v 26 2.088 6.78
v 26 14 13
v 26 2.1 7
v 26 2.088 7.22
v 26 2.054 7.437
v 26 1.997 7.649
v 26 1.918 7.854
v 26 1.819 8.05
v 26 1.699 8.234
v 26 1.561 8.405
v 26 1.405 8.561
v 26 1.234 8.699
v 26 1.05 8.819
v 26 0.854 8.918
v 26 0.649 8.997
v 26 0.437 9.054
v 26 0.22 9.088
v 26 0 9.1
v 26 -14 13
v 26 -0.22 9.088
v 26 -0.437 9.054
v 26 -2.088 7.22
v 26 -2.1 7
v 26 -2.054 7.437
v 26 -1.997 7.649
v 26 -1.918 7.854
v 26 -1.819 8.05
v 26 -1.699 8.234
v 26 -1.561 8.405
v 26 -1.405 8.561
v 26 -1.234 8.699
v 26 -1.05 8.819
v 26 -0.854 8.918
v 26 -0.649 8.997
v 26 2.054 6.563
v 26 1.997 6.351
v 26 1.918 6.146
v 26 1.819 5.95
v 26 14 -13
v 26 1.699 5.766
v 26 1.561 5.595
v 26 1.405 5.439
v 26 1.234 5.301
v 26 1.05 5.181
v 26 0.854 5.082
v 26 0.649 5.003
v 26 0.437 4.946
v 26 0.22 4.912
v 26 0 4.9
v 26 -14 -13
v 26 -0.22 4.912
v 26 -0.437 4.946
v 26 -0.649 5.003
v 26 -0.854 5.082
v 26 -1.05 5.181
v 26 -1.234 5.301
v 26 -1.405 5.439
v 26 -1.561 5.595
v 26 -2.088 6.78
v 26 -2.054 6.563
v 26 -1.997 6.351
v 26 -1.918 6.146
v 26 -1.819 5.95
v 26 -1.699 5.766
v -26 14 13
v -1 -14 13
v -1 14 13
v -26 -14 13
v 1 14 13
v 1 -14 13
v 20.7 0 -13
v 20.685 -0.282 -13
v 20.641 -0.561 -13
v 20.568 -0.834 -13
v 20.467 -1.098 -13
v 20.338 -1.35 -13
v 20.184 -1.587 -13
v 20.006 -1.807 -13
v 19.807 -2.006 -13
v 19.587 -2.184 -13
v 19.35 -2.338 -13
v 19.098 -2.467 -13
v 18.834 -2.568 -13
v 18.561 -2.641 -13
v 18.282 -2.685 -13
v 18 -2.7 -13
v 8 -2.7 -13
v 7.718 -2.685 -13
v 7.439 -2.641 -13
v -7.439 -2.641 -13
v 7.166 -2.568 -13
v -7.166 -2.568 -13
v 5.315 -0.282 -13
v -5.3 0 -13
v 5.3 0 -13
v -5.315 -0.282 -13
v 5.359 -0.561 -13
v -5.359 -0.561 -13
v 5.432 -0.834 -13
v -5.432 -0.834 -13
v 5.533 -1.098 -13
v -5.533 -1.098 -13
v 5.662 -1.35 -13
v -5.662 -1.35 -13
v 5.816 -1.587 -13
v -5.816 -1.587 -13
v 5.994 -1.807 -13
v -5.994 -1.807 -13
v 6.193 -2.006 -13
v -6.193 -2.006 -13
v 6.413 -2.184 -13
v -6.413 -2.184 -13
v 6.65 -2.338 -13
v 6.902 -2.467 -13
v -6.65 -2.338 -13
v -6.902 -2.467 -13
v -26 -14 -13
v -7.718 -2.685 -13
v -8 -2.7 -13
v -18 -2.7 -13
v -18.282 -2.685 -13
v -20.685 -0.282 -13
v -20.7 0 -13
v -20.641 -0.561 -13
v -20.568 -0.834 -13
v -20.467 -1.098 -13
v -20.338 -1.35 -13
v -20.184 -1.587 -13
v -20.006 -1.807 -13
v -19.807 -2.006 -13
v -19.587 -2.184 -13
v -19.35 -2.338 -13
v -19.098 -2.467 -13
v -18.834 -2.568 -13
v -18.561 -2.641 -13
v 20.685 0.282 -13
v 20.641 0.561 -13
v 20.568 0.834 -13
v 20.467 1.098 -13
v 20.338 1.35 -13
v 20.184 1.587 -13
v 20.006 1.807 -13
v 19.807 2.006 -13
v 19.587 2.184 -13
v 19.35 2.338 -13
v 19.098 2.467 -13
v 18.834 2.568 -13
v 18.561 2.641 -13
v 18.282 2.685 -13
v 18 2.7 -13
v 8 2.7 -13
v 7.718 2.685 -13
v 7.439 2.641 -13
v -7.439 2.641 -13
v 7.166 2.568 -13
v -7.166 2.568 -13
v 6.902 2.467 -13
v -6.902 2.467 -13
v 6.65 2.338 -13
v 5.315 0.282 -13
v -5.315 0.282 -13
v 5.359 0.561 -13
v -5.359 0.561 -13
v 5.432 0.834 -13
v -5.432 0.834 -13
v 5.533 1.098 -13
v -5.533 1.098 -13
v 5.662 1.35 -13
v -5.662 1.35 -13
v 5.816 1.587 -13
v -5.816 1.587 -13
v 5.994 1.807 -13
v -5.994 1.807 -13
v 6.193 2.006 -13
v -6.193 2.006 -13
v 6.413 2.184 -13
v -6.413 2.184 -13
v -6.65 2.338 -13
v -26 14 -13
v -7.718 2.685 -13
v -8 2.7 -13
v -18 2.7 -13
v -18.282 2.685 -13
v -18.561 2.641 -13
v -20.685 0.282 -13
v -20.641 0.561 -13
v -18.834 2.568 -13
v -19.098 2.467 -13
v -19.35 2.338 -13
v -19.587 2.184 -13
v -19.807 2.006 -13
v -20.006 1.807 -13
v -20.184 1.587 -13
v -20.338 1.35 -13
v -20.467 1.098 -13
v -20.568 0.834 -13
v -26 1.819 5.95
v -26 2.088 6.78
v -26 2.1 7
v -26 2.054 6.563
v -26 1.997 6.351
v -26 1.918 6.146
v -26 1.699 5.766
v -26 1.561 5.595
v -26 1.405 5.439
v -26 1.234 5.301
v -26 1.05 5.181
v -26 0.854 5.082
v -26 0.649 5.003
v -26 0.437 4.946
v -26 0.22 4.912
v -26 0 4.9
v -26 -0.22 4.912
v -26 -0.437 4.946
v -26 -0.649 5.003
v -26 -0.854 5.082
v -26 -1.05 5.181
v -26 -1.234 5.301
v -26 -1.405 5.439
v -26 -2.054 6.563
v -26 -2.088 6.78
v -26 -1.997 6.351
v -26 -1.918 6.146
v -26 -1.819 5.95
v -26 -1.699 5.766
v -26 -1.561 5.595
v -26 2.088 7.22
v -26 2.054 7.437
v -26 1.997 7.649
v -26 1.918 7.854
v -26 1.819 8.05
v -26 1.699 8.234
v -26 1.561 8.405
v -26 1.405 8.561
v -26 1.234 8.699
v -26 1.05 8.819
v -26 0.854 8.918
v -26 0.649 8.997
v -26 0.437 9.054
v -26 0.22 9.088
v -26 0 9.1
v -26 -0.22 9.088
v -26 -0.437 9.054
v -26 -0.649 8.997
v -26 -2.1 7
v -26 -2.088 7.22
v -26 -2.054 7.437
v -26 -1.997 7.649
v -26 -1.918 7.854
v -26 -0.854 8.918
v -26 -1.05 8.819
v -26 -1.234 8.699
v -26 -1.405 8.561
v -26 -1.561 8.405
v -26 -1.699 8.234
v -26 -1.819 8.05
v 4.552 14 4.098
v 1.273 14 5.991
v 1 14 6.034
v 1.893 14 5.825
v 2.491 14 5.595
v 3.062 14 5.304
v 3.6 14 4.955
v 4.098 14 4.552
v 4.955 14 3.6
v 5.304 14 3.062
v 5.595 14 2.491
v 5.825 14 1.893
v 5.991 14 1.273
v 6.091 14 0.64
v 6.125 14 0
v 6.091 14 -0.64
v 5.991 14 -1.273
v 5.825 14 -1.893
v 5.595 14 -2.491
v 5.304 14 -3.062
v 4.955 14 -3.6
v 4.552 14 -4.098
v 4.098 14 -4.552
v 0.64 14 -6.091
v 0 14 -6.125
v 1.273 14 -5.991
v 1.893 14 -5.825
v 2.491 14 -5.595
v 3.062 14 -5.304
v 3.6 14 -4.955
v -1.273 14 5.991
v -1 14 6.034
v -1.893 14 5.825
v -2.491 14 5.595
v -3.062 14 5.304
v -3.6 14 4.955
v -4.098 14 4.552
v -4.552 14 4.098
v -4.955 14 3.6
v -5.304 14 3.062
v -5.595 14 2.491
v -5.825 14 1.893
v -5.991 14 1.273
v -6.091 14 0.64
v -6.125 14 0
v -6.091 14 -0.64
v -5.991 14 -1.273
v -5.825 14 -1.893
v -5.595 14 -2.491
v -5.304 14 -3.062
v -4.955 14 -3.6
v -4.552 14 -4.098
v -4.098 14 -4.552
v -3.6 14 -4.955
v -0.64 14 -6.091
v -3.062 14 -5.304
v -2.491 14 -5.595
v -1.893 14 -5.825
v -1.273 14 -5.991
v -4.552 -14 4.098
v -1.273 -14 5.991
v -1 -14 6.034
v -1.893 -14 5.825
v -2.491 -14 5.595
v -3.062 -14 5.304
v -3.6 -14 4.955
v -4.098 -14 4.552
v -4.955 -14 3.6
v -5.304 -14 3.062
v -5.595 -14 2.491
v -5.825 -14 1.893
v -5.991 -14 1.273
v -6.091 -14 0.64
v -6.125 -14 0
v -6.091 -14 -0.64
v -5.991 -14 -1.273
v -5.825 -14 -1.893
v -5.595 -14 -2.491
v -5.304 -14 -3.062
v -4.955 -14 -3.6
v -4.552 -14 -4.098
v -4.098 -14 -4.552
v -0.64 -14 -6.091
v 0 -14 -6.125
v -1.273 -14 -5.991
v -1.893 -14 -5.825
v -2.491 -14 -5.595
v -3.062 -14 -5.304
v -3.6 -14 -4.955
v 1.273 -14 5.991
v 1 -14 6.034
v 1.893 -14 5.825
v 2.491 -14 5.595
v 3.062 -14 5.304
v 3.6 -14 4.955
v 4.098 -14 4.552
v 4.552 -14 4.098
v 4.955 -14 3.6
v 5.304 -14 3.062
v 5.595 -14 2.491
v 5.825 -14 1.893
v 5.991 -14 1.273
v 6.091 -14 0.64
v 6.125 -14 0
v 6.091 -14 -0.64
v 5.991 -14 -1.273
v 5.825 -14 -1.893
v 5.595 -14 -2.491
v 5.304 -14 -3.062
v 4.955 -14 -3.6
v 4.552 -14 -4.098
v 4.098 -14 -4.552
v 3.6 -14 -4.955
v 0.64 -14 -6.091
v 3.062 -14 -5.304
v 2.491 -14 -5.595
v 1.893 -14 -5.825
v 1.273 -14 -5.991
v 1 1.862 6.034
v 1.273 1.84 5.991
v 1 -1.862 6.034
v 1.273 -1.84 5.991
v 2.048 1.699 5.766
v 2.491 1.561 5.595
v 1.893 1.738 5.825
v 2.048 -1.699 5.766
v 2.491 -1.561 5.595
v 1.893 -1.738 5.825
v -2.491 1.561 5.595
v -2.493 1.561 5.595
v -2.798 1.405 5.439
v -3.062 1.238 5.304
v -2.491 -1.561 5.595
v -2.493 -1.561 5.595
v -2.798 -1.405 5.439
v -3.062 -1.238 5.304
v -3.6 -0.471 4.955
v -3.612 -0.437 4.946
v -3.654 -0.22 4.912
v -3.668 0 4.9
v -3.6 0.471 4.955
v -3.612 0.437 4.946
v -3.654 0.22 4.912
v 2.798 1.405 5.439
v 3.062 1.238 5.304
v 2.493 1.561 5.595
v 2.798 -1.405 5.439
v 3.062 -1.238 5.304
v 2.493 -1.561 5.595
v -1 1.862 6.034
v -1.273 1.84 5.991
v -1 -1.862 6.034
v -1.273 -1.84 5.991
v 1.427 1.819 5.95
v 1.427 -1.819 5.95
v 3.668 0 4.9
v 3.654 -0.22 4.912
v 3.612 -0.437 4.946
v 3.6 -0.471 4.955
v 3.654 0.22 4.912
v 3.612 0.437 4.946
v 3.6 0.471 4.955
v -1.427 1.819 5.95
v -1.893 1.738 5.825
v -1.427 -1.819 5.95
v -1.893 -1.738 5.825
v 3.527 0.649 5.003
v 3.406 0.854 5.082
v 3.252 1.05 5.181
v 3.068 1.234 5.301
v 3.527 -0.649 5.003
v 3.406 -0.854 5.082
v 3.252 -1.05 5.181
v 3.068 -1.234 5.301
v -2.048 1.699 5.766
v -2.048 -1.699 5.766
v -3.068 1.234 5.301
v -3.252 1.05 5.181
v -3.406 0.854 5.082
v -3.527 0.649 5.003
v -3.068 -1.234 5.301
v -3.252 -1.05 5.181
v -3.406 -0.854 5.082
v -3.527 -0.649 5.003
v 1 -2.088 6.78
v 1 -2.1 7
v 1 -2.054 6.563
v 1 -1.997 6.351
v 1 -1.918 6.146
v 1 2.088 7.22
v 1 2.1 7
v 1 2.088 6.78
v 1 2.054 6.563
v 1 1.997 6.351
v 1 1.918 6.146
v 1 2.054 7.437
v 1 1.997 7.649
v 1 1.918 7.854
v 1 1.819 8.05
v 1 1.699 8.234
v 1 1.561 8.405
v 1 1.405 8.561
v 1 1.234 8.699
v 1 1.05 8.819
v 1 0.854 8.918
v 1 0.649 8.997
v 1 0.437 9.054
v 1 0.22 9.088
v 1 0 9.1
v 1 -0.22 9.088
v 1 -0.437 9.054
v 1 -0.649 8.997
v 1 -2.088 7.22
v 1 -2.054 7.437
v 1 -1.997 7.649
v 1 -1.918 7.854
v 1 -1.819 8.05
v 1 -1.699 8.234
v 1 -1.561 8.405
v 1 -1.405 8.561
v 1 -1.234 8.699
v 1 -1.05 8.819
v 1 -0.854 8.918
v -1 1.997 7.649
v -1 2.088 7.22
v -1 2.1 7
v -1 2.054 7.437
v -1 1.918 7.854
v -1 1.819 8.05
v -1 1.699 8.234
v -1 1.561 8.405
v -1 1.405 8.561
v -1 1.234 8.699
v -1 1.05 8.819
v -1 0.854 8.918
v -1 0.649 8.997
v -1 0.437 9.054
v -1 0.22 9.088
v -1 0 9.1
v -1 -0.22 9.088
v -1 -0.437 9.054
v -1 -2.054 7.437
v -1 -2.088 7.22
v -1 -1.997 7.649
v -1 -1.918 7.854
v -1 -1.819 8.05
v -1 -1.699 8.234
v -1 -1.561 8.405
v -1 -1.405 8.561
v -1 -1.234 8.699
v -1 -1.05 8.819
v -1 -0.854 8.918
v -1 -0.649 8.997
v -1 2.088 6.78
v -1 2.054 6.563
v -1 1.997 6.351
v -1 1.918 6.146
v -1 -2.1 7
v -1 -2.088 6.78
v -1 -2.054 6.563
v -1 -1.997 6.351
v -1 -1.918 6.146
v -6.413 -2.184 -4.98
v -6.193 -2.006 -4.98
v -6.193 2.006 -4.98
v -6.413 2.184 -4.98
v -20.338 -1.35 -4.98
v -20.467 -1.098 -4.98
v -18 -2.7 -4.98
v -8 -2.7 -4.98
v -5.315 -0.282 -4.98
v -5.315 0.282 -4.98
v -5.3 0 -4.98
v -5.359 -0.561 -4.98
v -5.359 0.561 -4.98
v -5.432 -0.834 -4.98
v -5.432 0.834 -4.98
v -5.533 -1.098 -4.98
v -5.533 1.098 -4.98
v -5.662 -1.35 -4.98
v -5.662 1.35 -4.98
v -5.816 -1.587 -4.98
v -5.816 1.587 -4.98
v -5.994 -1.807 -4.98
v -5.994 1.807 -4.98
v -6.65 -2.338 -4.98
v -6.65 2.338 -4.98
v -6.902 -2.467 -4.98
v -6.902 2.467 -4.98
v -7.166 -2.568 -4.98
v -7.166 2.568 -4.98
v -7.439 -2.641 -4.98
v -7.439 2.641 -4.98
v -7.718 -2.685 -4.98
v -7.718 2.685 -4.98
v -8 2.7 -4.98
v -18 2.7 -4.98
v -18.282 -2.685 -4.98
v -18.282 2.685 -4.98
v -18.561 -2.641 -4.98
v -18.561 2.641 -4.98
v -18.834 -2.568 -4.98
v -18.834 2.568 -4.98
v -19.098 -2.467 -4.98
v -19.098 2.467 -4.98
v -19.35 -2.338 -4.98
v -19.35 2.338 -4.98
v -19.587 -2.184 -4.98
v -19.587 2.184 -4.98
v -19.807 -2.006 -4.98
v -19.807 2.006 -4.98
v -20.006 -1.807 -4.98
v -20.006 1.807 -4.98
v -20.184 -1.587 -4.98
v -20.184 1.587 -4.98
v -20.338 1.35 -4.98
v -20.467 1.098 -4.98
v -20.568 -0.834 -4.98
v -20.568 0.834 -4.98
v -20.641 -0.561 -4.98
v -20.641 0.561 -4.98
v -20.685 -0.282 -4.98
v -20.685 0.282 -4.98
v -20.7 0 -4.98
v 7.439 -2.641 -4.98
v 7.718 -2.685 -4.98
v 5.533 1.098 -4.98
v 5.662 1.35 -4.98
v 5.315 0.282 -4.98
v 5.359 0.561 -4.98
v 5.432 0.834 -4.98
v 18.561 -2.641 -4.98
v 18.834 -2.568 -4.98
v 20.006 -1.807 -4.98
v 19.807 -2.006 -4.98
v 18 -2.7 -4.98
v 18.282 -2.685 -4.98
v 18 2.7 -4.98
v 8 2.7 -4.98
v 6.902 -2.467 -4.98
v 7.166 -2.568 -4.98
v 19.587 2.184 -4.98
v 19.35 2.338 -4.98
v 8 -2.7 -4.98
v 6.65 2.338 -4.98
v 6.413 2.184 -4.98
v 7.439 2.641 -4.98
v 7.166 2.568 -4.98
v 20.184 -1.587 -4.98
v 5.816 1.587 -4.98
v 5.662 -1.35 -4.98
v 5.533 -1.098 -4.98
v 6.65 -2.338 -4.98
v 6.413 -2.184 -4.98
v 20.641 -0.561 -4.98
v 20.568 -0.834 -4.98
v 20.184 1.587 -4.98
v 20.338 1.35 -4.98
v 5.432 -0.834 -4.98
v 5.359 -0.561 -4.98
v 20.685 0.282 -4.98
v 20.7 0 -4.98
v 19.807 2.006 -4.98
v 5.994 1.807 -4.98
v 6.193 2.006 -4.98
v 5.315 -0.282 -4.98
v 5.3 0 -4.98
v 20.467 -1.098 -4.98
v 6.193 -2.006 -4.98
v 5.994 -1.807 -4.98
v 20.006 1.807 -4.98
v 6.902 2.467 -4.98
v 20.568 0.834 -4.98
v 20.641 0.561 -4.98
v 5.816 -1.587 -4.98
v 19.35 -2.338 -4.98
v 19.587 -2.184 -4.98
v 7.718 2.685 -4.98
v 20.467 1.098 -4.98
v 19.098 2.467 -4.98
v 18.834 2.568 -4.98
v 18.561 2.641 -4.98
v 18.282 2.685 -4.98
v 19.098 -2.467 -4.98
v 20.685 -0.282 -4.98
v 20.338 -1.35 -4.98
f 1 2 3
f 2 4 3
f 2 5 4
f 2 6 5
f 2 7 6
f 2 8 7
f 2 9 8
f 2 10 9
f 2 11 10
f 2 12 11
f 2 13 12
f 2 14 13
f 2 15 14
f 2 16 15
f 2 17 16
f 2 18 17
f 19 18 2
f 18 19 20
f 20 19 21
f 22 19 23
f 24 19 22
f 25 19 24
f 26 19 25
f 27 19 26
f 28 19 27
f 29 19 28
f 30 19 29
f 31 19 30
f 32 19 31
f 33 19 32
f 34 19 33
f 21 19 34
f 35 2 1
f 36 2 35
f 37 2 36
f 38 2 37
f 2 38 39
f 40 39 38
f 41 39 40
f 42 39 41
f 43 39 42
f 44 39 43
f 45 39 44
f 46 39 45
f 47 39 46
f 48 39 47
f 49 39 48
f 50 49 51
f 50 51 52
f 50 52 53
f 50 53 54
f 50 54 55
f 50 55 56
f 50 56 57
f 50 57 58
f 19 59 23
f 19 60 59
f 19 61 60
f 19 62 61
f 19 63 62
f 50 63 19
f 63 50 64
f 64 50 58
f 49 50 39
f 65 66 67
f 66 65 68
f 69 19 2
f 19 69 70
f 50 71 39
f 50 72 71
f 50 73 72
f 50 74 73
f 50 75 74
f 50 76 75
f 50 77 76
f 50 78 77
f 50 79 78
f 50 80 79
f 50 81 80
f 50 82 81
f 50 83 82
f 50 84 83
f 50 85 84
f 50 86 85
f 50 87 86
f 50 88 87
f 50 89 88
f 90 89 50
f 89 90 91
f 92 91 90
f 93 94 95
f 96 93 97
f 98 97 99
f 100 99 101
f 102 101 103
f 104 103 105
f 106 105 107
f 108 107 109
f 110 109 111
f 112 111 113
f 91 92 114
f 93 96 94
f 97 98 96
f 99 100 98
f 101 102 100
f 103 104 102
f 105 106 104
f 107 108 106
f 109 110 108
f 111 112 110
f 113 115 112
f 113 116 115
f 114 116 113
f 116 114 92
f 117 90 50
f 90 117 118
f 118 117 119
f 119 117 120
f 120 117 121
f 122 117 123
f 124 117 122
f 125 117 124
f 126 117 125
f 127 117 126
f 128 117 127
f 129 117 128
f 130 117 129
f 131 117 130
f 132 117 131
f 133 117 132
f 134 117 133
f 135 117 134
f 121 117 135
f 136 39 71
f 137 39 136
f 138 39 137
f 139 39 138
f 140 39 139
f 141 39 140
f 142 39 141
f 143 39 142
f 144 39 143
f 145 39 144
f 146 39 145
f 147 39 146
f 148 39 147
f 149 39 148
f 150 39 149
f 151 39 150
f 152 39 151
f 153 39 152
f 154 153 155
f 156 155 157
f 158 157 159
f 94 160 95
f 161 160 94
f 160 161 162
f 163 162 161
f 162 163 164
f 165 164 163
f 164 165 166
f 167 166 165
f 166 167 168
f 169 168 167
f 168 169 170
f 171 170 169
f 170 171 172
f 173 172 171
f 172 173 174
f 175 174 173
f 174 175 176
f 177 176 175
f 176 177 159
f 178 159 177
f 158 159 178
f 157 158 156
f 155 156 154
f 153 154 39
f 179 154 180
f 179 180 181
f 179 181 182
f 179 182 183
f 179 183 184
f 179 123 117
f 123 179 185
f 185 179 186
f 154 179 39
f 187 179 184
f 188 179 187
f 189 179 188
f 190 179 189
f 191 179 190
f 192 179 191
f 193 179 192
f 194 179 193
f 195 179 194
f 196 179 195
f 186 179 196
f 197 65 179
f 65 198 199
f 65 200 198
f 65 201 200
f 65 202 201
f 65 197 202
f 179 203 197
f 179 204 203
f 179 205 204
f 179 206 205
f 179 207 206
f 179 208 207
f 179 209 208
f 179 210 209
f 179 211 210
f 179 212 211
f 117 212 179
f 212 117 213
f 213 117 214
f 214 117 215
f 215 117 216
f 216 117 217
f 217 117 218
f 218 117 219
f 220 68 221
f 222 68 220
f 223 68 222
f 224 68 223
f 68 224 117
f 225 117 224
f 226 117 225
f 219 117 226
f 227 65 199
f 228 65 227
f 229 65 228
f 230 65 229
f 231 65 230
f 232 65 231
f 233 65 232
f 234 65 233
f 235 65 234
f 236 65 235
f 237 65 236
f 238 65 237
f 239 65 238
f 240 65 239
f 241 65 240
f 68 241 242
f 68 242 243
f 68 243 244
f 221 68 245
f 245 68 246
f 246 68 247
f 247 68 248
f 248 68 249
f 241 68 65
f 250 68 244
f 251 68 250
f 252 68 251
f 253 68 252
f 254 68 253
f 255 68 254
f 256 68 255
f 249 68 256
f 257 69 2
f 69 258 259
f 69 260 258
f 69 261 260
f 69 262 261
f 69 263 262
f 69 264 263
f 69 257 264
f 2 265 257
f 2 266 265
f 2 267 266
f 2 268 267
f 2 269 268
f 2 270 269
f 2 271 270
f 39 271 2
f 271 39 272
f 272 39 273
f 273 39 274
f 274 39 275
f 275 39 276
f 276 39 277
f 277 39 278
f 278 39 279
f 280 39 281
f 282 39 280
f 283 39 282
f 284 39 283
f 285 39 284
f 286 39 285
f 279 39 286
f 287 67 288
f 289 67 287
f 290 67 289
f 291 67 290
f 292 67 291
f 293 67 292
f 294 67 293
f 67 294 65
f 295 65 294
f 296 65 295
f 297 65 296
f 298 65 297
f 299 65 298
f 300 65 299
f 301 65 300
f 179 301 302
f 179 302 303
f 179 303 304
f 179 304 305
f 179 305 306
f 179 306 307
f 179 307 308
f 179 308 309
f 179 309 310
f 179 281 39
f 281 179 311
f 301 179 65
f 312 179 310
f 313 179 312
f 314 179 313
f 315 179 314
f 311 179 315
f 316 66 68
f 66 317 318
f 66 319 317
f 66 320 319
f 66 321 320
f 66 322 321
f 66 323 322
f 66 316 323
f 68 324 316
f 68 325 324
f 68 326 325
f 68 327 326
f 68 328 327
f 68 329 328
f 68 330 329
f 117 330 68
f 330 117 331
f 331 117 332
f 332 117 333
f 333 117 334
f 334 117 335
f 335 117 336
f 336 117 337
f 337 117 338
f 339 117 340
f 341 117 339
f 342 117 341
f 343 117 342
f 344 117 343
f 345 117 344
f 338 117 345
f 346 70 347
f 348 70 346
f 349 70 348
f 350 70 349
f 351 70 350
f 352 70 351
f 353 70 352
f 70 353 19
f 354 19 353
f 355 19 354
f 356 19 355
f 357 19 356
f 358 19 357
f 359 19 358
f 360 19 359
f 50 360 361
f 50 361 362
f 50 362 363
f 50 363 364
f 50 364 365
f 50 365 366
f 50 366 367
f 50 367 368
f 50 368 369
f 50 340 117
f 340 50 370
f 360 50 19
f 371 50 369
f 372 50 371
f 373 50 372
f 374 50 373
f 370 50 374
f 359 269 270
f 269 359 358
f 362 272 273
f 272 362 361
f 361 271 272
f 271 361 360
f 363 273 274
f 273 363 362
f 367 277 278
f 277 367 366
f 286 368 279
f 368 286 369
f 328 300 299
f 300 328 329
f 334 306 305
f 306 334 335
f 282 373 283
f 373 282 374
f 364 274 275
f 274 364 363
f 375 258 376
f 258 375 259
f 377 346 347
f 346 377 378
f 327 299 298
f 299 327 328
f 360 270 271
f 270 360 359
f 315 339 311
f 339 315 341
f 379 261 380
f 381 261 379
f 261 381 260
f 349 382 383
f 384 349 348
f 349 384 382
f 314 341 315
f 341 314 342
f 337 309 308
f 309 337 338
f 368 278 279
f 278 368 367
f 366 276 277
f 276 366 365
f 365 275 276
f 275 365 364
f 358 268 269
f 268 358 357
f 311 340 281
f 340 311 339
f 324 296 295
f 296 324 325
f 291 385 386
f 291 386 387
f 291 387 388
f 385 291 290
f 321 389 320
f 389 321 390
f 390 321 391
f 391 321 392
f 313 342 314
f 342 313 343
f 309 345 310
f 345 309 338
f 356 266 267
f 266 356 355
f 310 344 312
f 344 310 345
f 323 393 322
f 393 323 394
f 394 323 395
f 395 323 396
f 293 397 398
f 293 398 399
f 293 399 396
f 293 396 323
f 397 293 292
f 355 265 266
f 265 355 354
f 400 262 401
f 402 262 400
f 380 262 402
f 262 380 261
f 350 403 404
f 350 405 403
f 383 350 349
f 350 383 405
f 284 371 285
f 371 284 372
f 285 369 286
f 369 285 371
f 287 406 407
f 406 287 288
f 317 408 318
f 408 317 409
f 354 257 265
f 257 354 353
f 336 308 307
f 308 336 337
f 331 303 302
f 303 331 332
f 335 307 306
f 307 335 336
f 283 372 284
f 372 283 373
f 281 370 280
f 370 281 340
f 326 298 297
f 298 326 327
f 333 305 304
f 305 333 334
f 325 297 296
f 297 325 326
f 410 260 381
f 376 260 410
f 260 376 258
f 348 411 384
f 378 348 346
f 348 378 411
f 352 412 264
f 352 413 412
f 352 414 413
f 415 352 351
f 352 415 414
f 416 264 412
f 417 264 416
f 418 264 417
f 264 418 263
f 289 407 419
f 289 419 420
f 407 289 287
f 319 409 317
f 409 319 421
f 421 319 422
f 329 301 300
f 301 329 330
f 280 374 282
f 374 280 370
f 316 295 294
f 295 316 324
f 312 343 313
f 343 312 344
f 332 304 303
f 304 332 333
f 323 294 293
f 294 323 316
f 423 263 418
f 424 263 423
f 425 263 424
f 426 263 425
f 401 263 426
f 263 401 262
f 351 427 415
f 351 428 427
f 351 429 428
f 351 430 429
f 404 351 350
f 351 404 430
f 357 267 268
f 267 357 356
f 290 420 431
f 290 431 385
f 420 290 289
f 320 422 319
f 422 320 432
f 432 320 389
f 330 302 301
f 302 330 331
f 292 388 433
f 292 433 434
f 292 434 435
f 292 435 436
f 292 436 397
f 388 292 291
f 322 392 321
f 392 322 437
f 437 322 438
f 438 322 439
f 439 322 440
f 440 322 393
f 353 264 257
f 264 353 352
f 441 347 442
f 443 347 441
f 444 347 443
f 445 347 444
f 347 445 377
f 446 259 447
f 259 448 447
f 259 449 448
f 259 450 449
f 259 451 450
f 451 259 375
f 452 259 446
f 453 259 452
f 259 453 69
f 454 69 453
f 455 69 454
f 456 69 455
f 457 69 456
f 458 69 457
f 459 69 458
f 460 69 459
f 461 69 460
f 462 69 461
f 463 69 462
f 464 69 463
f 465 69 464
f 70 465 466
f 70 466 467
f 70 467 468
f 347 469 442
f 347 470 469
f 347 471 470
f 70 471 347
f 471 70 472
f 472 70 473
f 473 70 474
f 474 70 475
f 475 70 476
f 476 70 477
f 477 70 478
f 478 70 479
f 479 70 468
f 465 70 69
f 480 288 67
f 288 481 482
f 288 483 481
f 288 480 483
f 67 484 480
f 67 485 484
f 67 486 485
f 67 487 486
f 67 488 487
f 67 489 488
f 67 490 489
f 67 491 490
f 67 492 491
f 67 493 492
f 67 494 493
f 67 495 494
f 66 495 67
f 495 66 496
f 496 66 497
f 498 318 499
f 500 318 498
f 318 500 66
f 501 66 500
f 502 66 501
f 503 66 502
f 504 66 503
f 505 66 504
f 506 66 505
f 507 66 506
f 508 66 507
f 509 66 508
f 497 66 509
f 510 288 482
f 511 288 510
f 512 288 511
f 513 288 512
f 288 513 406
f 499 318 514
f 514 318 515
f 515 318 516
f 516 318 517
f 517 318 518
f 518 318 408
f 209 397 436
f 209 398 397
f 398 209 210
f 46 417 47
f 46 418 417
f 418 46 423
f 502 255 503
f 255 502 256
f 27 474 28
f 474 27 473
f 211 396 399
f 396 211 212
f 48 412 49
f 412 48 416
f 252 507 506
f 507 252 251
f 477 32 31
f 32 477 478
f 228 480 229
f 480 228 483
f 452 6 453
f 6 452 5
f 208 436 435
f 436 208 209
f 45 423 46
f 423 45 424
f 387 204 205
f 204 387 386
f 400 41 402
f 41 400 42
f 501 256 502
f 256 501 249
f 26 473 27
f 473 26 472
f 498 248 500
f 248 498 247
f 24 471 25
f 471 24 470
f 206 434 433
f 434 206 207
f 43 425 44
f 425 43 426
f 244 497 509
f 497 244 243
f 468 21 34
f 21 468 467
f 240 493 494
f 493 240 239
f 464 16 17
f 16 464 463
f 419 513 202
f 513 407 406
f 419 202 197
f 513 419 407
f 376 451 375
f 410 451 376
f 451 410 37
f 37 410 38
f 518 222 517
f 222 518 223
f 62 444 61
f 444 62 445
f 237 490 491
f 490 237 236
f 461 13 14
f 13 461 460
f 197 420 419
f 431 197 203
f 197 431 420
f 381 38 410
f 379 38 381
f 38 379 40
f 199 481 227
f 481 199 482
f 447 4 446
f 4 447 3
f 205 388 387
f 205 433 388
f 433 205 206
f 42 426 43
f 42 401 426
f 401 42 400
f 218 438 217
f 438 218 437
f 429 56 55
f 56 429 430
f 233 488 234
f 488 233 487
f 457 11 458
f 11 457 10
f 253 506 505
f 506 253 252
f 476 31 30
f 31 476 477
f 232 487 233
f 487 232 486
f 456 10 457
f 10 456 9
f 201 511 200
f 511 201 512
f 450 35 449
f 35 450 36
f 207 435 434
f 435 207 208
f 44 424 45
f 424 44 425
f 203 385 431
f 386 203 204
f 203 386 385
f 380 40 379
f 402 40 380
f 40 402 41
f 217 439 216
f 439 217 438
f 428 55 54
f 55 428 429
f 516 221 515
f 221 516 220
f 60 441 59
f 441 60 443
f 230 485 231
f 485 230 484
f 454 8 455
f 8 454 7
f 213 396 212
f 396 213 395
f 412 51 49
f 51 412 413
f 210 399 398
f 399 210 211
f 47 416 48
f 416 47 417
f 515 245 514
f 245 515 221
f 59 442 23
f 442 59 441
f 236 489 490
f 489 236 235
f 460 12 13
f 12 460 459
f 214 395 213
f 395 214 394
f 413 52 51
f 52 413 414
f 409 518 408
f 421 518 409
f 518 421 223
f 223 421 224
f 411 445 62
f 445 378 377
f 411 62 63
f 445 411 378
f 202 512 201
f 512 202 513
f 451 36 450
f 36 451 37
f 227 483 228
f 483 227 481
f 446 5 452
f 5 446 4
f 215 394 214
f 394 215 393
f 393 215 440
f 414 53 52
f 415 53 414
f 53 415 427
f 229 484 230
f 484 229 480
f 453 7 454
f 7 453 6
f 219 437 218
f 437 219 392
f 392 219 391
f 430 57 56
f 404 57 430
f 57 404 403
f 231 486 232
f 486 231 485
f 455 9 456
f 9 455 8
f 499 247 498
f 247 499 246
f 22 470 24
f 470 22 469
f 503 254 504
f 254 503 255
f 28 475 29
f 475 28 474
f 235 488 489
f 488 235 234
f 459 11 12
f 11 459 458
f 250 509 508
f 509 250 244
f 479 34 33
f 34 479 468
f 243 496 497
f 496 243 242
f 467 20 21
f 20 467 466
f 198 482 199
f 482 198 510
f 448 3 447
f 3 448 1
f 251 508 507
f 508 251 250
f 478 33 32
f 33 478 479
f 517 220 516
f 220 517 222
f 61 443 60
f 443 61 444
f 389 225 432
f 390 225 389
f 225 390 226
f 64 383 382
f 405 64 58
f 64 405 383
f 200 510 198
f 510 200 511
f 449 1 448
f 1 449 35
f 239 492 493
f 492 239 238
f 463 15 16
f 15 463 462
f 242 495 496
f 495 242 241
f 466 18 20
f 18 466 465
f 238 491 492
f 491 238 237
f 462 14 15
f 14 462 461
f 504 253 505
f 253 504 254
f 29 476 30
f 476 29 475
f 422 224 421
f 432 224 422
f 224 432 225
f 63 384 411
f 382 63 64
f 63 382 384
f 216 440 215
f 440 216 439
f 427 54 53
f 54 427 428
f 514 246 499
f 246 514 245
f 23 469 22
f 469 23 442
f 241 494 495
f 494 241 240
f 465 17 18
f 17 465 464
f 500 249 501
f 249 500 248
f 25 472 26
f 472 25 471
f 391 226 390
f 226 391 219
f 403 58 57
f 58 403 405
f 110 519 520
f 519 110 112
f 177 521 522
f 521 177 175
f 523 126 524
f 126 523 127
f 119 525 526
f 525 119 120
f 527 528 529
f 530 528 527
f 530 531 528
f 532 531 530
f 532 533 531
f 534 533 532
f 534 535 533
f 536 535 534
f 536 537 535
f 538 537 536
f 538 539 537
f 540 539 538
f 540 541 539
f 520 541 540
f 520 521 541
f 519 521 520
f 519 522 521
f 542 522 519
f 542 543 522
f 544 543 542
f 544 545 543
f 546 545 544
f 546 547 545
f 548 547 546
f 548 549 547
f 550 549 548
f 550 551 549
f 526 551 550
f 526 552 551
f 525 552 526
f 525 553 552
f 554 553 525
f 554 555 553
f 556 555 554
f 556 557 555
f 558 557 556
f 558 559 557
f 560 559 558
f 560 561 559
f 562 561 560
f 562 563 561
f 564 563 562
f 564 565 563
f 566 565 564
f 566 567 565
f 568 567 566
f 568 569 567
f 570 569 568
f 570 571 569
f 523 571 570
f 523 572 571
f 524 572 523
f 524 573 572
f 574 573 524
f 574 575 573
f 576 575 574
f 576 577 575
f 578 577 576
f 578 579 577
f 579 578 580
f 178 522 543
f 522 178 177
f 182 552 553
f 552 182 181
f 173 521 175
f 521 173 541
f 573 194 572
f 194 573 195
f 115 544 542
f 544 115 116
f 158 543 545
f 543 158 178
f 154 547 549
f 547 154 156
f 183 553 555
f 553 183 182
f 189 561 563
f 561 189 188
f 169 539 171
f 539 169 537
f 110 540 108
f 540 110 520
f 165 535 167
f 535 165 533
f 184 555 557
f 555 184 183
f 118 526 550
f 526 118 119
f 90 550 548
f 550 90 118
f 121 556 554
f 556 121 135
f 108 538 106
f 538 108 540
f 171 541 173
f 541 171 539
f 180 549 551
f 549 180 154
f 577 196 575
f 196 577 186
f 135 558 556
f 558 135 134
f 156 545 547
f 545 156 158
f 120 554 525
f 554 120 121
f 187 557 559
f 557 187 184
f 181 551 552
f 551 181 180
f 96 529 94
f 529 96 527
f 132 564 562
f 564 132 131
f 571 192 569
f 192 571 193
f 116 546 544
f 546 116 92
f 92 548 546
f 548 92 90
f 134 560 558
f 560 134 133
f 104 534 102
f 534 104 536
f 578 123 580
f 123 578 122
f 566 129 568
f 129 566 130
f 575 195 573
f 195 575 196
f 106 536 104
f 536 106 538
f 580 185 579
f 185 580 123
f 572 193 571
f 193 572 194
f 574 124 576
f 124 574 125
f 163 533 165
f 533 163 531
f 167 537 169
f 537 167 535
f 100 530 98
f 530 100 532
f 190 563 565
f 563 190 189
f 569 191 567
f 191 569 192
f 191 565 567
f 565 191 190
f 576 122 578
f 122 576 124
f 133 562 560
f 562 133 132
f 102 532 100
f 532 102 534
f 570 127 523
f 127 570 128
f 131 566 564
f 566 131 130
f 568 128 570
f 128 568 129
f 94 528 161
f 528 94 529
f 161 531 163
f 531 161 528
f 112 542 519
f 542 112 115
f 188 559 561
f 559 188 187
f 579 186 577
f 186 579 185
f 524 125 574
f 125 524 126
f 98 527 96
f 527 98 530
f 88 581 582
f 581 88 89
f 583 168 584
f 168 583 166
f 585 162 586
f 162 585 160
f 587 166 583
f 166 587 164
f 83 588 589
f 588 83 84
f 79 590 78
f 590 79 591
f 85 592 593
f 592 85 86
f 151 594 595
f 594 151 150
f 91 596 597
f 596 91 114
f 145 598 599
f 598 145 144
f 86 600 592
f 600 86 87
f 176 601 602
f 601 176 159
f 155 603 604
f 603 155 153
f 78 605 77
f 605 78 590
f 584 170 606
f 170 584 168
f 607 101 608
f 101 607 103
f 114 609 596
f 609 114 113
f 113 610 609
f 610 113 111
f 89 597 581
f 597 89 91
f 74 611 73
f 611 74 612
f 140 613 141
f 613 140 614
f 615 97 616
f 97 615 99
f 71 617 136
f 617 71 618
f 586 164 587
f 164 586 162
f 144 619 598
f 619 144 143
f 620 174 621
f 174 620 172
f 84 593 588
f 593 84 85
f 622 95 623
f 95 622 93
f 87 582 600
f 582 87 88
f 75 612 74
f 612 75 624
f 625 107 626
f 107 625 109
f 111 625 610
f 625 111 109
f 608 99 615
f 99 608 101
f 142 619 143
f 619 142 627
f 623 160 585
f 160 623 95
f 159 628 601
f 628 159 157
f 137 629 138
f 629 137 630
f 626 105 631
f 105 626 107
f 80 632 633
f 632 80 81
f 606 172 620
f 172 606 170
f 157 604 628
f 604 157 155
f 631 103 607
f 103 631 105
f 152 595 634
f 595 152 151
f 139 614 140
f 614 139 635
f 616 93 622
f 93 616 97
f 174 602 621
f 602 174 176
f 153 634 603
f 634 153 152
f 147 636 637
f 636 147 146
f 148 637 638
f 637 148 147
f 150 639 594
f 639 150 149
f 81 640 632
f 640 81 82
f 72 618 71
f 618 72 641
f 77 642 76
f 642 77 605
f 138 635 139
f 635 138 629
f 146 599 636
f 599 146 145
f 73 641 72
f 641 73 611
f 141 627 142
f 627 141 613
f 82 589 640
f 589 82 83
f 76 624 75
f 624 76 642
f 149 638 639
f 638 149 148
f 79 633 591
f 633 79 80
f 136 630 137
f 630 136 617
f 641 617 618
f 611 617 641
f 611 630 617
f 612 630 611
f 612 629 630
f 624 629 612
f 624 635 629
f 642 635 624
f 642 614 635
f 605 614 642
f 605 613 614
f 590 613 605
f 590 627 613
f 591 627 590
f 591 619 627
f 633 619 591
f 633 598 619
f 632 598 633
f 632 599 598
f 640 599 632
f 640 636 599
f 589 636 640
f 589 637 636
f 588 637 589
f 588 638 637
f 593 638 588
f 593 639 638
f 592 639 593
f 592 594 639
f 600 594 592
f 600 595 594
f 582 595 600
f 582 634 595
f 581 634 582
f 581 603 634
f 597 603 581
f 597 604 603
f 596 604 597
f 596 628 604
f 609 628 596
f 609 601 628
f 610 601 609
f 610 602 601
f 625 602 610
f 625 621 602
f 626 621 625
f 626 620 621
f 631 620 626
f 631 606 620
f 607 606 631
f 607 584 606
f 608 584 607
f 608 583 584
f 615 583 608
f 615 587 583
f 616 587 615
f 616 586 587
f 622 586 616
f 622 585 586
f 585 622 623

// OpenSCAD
// Split housing for 12 mm OD linear bearing.
$fn = 60;
eps = 0.02;
bearing_d = 12;
body_l = 52;
body_d = 28;
body_h = 26;
slot_w = 2;
module mount_slot(x) {
    hull() {
        translate([x - 5, 0, -body_h / 2 - eps]) cylinder(d = 5.4, h = 8 + 2 * eps);
        translate([x + 5, 0, -body_h / 2 - eps]) cylinder(d = 5.4, h = 8 + 2 * eps);
    }
}
difference() {
    cube([body_l, body_d, body_h], center = true);
    translate([0, -body_d / 2 - eps, 0]) rotate([-90, 0, 0]) cylinder(d = bearing_d + 0.25, h = body_d + 2 * eps);
    translate([-slot_w / 2, -body_d / 2 - eps, 0]) cube([slot_w, body_d + 2 * eps, body_h / 2 + eps]);
    translate([-body_l / 2 - eps, 0, body_h / 2 - 6]) rotate([0, 90, 0]) cylinder(d = 4.2, h = body_l + 2 * eps);
    mount_slot(-body_l / 4);
    mount_slot(body_l / 4);
}
